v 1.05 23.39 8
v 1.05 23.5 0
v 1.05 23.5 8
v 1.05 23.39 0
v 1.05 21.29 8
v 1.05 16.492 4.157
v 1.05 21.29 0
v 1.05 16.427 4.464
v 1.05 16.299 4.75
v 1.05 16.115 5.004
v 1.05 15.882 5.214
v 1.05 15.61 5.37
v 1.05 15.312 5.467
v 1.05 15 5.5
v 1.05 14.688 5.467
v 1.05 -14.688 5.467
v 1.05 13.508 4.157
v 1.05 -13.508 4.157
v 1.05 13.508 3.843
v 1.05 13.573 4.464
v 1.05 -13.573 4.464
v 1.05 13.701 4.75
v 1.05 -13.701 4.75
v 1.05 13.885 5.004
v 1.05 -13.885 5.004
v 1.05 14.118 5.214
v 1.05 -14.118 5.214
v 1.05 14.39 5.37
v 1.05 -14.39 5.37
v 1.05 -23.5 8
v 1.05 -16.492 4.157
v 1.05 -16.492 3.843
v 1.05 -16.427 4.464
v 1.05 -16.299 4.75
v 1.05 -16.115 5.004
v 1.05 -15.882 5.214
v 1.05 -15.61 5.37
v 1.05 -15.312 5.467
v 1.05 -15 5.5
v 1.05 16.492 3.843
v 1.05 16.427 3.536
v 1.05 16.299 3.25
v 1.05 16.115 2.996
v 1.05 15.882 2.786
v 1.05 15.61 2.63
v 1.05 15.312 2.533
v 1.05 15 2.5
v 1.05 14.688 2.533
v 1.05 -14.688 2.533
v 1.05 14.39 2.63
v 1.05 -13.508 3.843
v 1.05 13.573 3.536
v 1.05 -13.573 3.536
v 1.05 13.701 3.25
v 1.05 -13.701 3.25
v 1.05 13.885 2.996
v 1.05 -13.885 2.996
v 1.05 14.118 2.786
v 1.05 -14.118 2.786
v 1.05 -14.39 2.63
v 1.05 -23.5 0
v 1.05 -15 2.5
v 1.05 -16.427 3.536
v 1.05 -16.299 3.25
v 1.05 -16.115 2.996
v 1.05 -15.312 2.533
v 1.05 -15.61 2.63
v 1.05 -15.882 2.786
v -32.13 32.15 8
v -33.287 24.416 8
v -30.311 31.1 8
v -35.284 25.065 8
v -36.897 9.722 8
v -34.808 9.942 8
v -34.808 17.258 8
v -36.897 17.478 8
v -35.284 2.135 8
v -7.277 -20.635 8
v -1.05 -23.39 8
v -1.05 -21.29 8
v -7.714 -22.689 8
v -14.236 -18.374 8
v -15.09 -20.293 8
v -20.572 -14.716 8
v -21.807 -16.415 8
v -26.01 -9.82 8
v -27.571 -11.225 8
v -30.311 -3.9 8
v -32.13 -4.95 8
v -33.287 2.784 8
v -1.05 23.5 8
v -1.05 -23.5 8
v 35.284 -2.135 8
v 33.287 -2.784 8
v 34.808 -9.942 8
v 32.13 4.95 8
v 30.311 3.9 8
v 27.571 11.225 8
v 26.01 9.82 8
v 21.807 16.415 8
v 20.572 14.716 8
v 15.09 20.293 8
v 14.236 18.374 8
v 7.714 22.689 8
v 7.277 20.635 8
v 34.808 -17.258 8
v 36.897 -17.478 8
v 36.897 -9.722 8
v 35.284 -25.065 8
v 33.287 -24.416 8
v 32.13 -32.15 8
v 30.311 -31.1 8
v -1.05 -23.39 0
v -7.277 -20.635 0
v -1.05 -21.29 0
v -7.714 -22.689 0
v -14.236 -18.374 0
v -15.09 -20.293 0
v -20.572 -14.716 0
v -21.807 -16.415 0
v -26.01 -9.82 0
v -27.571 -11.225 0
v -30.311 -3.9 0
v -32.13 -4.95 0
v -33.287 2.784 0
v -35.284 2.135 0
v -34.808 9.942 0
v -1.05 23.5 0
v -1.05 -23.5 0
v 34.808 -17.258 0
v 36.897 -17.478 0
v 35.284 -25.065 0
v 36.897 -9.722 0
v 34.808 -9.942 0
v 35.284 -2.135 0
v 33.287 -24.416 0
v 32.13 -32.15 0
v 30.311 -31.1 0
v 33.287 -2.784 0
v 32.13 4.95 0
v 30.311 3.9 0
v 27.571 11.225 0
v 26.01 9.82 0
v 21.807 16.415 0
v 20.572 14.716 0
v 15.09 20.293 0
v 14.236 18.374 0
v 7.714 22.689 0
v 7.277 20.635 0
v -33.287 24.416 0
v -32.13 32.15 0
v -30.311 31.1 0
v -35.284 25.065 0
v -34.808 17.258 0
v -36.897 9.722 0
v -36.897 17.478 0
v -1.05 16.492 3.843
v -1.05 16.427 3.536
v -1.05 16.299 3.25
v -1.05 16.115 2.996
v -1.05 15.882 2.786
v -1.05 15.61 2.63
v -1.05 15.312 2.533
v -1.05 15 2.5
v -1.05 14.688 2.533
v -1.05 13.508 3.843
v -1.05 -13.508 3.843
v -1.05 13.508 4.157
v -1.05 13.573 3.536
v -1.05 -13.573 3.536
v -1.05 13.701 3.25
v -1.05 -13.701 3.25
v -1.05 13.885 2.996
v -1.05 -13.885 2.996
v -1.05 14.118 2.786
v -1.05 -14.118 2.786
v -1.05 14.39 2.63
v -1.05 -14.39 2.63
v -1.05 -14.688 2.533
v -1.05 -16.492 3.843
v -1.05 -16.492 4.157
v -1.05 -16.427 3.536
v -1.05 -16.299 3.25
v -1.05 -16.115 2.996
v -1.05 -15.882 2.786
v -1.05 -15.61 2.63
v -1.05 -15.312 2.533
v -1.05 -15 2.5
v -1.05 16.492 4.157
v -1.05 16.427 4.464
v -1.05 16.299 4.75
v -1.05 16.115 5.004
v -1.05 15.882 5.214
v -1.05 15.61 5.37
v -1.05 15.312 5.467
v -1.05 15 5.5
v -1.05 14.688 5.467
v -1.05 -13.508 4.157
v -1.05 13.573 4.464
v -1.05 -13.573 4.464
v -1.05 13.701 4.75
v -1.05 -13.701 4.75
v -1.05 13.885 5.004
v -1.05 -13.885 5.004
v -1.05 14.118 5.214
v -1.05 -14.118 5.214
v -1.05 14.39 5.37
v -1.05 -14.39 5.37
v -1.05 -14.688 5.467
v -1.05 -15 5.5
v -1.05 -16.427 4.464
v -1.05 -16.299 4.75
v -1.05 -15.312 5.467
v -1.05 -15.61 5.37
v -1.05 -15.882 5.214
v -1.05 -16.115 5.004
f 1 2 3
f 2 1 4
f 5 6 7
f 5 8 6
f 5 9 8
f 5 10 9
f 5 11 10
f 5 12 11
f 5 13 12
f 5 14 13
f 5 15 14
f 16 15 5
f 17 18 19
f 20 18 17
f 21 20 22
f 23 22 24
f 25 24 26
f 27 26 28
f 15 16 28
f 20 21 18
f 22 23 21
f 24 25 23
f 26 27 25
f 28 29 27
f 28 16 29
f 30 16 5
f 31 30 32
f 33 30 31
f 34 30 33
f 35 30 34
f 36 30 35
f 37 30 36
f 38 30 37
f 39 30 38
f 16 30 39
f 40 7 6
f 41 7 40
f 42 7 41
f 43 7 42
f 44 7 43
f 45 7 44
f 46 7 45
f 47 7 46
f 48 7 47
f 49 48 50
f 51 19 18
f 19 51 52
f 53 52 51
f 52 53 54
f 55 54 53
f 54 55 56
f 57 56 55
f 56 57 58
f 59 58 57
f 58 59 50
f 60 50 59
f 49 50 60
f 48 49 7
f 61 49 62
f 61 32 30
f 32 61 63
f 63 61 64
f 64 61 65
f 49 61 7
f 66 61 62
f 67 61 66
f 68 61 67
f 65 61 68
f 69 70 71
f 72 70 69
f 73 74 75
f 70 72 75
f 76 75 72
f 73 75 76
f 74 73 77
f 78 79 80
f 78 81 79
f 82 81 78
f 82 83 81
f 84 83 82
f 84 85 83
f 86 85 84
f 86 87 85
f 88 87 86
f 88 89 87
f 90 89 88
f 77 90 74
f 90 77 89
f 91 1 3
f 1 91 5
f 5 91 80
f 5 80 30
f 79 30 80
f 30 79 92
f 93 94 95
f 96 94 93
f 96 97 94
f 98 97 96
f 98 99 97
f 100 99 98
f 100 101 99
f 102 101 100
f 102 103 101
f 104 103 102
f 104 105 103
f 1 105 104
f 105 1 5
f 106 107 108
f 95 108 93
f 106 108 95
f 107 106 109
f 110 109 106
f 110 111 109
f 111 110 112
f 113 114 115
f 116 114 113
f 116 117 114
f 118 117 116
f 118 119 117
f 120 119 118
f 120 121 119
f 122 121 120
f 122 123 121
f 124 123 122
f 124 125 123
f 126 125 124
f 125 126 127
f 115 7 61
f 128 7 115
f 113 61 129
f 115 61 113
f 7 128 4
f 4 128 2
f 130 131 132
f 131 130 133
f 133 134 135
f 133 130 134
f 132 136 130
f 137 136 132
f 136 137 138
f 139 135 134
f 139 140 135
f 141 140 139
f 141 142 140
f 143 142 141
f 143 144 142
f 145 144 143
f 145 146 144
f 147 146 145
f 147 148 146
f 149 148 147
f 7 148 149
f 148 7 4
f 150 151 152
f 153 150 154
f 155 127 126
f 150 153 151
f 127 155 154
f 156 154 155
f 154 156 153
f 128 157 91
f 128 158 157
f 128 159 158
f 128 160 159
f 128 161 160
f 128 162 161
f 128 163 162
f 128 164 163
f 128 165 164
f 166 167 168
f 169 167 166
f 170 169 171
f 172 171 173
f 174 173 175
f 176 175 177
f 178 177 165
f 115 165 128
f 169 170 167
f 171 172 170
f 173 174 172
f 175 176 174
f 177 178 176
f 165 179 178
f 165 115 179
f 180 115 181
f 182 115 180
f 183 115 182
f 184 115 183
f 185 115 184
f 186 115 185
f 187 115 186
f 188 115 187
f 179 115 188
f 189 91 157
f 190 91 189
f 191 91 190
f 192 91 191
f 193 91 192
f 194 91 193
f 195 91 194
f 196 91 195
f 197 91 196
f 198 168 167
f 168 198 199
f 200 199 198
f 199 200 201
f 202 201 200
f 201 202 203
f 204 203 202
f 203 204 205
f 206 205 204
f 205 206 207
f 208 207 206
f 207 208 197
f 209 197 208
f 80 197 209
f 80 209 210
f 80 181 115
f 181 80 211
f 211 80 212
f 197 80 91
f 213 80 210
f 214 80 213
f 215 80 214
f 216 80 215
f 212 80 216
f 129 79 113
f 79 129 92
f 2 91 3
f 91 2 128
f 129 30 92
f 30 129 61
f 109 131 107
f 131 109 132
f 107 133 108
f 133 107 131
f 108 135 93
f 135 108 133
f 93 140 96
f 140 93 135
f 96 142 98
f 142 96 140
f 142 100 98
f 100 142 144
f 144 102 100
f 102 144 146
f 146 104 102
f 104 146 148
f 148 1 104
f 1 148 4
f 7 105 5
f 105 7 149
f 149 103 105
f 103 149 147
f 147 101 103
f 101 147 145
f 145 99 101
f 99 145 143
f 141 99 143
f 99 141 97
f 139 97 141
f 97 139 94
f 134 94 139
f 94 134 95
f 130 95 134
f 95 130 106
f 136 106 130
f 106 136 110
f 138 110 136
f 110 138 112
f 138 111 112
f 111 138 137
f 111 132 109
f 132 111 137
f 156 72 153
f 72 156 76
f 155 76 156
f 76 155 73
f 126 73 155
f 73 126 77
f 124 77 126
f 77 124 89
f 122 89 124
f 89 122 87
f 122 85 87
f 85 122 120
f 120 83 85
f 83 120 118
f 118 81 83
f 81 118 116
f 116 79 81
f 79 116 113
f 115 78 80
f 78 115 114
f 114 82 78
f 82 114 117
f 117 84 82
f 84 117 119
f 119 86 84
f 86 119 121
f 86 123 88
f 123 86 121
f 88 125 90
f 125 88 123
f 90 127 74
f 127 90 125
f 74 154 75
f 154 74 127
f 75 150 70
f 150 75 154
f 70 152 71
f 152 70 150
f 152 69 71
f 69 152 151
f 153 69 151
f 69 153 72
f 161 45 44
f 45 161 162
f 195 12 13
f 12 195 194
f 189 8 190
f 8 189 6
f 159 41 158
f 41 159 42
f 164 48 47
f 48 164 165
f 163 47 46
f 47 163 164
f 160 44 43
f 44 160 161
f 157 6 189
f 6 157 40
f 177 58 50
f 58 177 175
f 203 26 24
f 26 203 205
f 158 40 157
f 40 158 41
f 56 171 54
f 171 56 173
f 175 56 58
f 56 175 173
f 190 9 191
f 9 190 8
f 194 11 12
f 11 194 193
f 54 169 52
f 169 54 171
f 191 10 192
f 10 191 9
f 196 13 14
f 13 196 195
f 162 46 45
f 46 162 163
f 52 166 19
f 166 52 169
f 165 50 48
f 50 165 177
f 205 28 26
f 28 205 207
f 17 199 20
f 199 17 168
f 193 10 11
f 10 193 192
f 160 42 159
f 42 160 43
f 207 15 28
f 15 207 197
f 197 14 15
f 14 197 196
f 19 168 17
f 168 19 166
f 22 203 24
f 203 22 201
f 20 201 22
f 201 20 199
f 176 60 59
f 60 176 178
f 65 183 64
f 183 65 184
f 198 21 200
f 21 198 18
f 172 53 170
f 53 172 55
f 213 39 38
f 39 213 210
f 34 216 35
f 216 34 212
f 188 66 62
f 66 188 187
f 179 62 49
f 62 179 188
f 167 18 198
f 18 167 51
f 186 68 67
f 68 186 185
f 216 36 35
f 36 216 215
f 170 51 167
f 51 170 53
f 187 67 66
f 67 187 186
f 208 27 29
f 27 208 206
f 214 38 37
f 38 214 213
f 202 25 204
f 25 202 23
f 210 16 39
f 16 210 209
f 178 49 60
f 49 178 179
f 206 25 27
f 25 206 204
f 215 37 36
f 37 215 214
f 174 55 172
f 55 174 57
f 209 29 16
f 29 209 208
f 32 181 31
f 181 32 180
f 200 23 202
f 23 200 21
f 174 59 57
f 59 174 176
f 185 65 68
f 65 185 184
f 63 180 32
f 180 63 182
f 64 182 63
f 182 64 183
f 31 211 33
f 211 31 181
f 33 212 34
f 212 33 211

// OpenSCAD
// file: arc.scad
// Creative Commons Attribution
// chickenchuck040
// https://www.thingiverse.com/thing:1092611/

module arc(radius, thick, angle){
	intersection(){
		union(){
			rights = floor(angle/90);
			remain = angle-rights*90;
			if(angle > 90){
				for(i = [0:rights-1]){
					rotate(i*90-(rights-1)*90/2){
						polygon([[0, 0], [radius+thick, (radius+thick)*tan(90/2)], [radius+thick, -(radius+thick)*tan(90/2)]]);
					}
				}
				rotate(-(rights)*90/2)
					polygon([[0, 0], [radius+thick, 0], [radius+thick, -(radius+thick)*tan(remain/2)]]);
				rotate((rights)*90/2)
					polygon([[0, 0], [radius+thick, (radius+thick)*tan(remain/2)], [radius+thick, 0]]);
			}else{
				polygon([[0, 0], [radius+thick, (radius+thick)*tan(angle/2)], [radius+thick, -(radius+thick)*tan(angle/2)]]);
			}
		}
		difference(){
			circle(radius+thick);
			circle(radius);
		}
	}
}

arc(10, 3, 300);
// main file
// Mounting bracket for use inside a jam-jar
// https://github.com/mcqn/jj55

// Uses the arc generating OpenSCAD library from https://www.thingiverse.com/thing:1092611/
use <arc.scad>


// Variables
//

// Change these to suit the jar you're using
neck_diameter = 47;
jar_outside_diameter = 70;

// Diameter of the mounting holes to cut out of the mounting plate
mounting_hole_diameter = 3;
// Distance between the centres of the mounting holes
mounting_hole_separation = 30;



// Constants
// You shouldn't need to change these
//

// Length of the flexible arms (in degrees)
flex_angle = 120;
// Thickness of the arms
assembly_thickness = 2.1;
// Width of each mount
assembly_width = 8;


difference() {
    union() {
        // Mounting plate
        translate([-assembly_thickness/2, -neck_diameter/2, 0]) 
            cube([assembly_thickness, neck_diameter, assembly_width]);

        // Flexible arms
        flex_arm();
        rotate([0,0,180]) flex_arm();
    };

    // Mounting holes
    translate([-assembly_thickness, mounting_hole_separation/2, assembly_width/2]) 
        rotate([0,90,0]) 
        cylinder(d=mounting_hole_diameter, h=2*assembly_thickness, $fn=30);
    translate([-assembly_thickness, -mounting_hole_separation/2, assembly_width/2]) 
        rotate([0,90,0]) 
        cylinder(d=mounting_hole_diameter, h=2*assembly_thickness, $fn=30);
}

module flex_arm()
{
    translate([0, (neck_diameter-jar_outside_diameter)/2-assembly_thickness, 0])
        // Have it 
        rotate([0, 0, (180-flex_angle)/2]) 
        // Make it 3D
        linear_extrude(assembly_width) 
        // Create 2D arc
        arc(jar_outside_diameter/2, assembly_thickness, flex_angle);   
}
